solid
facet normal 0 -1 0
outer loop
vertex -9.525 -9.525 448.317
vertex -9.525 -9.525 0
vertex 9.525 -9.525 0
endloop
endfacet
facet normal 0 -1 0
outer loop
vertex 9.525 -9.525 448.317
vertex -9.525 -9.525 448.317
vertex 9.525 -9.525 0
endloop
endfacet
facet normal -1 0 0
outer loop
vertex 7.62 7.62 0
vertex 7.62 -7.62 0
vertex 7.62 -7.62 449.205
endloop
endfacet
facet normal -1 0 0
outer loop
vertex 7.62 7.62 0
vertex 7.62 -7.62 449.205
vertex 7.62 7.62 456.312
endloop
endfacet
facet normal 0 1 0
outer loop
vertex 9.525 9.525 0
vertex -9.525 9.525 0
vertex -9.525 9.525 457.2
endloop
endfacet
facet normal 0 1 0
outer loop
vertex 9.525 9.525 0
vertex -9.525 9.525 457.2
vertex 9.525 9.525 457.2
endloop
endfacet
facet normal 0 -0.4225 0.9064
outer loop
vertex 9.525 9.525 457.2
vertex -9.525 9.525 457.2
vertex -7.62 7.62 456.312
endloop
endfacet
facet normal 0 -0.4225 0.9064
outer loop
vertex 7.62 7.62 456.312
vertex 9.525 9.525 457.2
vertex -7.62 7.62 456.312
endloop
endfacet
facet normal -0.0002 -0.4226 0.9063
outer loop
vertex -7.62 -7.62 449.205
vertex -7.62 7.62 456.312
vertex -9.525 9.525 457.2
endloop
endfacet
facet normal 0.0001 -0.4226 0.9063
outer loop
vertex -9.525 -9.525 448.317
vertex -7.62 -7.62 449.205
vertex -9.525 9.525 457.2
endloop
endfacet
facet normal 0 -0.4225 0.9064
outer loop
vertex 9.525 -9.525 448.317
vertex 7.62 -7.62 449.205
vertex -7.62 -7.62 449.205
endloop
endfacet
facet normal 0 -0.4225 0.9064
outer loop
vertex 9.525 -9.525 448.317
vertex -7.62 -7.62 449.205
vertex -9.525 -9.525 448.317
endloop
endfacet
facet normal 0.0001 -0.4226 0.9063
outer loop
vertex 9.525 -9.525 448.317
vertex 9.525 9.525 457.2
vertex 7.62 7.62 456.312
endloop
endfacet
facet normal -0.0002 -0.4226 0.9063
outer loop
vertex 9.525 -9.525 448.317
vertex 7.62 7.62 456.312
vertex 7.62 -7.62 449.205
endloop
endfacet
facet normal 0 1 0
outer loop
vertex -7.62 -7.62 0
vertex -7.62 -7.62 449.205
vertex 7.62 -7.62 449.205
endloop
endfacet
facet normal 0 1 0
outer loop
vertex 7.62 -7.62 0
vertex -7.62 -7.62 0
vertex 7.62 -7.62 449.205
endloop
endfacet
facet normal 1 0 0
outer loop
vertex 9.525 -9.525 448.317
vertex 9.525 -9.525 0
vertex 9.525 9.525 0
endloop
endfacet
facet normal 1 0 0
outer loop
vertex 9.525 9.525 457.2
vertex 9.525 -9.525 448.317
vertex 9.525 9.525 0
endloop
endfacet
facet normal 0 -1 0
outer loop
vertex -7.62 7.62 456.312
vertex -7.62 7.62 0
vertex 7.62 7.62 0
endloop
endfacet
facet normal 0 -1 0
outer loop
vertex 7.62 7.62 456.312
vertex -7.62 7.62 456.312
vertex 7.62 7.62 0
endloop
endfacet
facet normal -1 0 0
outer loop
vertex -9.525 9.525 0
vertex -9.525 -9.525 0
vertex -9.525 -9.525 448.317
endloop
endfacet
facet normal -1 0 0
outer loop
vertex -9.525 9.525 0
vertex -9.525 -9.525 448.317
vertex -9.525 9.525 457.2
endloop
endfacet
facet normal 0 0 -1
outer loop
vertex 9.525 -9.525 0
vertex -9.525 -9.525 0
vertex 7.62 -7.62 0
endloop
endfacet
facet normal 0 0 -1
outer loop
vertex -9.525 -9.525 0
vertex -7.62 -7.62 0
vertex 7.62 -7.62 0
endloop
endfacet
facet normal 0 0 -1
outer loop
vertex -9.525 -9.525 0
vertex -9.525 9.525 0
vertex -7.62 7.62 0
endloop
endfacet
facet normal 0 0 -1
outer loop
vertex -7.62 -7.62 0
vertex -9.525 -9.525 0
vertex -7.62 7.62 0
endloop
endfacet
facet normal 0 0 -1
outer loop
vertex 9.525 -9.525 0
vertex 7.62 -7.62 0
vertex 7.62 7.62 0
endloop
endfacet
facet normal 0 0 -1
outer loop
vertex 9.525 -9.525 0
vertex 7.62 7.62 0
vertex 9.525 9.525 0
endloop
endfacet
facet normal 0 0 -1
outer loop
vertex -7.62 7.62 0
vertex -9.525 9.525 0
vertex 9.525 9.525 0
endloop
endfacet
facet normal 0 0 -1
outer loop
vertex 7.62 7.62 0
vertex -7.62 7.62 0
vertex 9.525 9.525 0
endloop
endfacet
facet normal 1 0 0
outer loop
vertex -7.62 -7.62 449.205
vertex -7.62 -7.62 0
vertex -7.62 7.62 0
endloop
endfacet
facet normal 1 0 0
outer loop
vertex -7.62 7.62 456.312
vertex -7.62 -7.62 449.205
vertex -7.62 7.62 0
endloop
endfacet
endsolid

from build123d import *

# Parameters (mm, degrees)
SKETCH4_W           = 19.05
SKETCH4_H           = 19.05
SKETCH4_W_2         = 15.24
SKETCH4_H_2         = 15.24
BOSS_EXTRUDE2_DEPTH = 457.2
CUT_EXTRUDE1_DEPTH  = 20.05


with BuildPart() as part:
    # Sketch4 → Boss-Extrude2 (new body)
    with BuildSketch(Plane.XY):
        Rectangle(SKETCH4_W, SKETCH4_H)
        Rectangle(SKETCH4_W_2, SKETCH4_H_2, mode=Mode.SUBTRACT)
    extrude(amount=BOSS_EXTRUDE2_DEPTH)

    # Sketch5 → Cut-Extrude1 (cut, through all)
    with BuildSketch(Plane(origin=(9.525, 0, 0), x_dir=(0, 0, -1), z_dir=(1, 0, 0))):
        Polygon((-457.2, 9.525), (-448.316839112, -9.525), (-457.2, -9.525), align=None)
    extrude(amount=-CUT_EXTRUDE1_DEPTH, mode=Mode.SUBTRACT)


solid = part.part
